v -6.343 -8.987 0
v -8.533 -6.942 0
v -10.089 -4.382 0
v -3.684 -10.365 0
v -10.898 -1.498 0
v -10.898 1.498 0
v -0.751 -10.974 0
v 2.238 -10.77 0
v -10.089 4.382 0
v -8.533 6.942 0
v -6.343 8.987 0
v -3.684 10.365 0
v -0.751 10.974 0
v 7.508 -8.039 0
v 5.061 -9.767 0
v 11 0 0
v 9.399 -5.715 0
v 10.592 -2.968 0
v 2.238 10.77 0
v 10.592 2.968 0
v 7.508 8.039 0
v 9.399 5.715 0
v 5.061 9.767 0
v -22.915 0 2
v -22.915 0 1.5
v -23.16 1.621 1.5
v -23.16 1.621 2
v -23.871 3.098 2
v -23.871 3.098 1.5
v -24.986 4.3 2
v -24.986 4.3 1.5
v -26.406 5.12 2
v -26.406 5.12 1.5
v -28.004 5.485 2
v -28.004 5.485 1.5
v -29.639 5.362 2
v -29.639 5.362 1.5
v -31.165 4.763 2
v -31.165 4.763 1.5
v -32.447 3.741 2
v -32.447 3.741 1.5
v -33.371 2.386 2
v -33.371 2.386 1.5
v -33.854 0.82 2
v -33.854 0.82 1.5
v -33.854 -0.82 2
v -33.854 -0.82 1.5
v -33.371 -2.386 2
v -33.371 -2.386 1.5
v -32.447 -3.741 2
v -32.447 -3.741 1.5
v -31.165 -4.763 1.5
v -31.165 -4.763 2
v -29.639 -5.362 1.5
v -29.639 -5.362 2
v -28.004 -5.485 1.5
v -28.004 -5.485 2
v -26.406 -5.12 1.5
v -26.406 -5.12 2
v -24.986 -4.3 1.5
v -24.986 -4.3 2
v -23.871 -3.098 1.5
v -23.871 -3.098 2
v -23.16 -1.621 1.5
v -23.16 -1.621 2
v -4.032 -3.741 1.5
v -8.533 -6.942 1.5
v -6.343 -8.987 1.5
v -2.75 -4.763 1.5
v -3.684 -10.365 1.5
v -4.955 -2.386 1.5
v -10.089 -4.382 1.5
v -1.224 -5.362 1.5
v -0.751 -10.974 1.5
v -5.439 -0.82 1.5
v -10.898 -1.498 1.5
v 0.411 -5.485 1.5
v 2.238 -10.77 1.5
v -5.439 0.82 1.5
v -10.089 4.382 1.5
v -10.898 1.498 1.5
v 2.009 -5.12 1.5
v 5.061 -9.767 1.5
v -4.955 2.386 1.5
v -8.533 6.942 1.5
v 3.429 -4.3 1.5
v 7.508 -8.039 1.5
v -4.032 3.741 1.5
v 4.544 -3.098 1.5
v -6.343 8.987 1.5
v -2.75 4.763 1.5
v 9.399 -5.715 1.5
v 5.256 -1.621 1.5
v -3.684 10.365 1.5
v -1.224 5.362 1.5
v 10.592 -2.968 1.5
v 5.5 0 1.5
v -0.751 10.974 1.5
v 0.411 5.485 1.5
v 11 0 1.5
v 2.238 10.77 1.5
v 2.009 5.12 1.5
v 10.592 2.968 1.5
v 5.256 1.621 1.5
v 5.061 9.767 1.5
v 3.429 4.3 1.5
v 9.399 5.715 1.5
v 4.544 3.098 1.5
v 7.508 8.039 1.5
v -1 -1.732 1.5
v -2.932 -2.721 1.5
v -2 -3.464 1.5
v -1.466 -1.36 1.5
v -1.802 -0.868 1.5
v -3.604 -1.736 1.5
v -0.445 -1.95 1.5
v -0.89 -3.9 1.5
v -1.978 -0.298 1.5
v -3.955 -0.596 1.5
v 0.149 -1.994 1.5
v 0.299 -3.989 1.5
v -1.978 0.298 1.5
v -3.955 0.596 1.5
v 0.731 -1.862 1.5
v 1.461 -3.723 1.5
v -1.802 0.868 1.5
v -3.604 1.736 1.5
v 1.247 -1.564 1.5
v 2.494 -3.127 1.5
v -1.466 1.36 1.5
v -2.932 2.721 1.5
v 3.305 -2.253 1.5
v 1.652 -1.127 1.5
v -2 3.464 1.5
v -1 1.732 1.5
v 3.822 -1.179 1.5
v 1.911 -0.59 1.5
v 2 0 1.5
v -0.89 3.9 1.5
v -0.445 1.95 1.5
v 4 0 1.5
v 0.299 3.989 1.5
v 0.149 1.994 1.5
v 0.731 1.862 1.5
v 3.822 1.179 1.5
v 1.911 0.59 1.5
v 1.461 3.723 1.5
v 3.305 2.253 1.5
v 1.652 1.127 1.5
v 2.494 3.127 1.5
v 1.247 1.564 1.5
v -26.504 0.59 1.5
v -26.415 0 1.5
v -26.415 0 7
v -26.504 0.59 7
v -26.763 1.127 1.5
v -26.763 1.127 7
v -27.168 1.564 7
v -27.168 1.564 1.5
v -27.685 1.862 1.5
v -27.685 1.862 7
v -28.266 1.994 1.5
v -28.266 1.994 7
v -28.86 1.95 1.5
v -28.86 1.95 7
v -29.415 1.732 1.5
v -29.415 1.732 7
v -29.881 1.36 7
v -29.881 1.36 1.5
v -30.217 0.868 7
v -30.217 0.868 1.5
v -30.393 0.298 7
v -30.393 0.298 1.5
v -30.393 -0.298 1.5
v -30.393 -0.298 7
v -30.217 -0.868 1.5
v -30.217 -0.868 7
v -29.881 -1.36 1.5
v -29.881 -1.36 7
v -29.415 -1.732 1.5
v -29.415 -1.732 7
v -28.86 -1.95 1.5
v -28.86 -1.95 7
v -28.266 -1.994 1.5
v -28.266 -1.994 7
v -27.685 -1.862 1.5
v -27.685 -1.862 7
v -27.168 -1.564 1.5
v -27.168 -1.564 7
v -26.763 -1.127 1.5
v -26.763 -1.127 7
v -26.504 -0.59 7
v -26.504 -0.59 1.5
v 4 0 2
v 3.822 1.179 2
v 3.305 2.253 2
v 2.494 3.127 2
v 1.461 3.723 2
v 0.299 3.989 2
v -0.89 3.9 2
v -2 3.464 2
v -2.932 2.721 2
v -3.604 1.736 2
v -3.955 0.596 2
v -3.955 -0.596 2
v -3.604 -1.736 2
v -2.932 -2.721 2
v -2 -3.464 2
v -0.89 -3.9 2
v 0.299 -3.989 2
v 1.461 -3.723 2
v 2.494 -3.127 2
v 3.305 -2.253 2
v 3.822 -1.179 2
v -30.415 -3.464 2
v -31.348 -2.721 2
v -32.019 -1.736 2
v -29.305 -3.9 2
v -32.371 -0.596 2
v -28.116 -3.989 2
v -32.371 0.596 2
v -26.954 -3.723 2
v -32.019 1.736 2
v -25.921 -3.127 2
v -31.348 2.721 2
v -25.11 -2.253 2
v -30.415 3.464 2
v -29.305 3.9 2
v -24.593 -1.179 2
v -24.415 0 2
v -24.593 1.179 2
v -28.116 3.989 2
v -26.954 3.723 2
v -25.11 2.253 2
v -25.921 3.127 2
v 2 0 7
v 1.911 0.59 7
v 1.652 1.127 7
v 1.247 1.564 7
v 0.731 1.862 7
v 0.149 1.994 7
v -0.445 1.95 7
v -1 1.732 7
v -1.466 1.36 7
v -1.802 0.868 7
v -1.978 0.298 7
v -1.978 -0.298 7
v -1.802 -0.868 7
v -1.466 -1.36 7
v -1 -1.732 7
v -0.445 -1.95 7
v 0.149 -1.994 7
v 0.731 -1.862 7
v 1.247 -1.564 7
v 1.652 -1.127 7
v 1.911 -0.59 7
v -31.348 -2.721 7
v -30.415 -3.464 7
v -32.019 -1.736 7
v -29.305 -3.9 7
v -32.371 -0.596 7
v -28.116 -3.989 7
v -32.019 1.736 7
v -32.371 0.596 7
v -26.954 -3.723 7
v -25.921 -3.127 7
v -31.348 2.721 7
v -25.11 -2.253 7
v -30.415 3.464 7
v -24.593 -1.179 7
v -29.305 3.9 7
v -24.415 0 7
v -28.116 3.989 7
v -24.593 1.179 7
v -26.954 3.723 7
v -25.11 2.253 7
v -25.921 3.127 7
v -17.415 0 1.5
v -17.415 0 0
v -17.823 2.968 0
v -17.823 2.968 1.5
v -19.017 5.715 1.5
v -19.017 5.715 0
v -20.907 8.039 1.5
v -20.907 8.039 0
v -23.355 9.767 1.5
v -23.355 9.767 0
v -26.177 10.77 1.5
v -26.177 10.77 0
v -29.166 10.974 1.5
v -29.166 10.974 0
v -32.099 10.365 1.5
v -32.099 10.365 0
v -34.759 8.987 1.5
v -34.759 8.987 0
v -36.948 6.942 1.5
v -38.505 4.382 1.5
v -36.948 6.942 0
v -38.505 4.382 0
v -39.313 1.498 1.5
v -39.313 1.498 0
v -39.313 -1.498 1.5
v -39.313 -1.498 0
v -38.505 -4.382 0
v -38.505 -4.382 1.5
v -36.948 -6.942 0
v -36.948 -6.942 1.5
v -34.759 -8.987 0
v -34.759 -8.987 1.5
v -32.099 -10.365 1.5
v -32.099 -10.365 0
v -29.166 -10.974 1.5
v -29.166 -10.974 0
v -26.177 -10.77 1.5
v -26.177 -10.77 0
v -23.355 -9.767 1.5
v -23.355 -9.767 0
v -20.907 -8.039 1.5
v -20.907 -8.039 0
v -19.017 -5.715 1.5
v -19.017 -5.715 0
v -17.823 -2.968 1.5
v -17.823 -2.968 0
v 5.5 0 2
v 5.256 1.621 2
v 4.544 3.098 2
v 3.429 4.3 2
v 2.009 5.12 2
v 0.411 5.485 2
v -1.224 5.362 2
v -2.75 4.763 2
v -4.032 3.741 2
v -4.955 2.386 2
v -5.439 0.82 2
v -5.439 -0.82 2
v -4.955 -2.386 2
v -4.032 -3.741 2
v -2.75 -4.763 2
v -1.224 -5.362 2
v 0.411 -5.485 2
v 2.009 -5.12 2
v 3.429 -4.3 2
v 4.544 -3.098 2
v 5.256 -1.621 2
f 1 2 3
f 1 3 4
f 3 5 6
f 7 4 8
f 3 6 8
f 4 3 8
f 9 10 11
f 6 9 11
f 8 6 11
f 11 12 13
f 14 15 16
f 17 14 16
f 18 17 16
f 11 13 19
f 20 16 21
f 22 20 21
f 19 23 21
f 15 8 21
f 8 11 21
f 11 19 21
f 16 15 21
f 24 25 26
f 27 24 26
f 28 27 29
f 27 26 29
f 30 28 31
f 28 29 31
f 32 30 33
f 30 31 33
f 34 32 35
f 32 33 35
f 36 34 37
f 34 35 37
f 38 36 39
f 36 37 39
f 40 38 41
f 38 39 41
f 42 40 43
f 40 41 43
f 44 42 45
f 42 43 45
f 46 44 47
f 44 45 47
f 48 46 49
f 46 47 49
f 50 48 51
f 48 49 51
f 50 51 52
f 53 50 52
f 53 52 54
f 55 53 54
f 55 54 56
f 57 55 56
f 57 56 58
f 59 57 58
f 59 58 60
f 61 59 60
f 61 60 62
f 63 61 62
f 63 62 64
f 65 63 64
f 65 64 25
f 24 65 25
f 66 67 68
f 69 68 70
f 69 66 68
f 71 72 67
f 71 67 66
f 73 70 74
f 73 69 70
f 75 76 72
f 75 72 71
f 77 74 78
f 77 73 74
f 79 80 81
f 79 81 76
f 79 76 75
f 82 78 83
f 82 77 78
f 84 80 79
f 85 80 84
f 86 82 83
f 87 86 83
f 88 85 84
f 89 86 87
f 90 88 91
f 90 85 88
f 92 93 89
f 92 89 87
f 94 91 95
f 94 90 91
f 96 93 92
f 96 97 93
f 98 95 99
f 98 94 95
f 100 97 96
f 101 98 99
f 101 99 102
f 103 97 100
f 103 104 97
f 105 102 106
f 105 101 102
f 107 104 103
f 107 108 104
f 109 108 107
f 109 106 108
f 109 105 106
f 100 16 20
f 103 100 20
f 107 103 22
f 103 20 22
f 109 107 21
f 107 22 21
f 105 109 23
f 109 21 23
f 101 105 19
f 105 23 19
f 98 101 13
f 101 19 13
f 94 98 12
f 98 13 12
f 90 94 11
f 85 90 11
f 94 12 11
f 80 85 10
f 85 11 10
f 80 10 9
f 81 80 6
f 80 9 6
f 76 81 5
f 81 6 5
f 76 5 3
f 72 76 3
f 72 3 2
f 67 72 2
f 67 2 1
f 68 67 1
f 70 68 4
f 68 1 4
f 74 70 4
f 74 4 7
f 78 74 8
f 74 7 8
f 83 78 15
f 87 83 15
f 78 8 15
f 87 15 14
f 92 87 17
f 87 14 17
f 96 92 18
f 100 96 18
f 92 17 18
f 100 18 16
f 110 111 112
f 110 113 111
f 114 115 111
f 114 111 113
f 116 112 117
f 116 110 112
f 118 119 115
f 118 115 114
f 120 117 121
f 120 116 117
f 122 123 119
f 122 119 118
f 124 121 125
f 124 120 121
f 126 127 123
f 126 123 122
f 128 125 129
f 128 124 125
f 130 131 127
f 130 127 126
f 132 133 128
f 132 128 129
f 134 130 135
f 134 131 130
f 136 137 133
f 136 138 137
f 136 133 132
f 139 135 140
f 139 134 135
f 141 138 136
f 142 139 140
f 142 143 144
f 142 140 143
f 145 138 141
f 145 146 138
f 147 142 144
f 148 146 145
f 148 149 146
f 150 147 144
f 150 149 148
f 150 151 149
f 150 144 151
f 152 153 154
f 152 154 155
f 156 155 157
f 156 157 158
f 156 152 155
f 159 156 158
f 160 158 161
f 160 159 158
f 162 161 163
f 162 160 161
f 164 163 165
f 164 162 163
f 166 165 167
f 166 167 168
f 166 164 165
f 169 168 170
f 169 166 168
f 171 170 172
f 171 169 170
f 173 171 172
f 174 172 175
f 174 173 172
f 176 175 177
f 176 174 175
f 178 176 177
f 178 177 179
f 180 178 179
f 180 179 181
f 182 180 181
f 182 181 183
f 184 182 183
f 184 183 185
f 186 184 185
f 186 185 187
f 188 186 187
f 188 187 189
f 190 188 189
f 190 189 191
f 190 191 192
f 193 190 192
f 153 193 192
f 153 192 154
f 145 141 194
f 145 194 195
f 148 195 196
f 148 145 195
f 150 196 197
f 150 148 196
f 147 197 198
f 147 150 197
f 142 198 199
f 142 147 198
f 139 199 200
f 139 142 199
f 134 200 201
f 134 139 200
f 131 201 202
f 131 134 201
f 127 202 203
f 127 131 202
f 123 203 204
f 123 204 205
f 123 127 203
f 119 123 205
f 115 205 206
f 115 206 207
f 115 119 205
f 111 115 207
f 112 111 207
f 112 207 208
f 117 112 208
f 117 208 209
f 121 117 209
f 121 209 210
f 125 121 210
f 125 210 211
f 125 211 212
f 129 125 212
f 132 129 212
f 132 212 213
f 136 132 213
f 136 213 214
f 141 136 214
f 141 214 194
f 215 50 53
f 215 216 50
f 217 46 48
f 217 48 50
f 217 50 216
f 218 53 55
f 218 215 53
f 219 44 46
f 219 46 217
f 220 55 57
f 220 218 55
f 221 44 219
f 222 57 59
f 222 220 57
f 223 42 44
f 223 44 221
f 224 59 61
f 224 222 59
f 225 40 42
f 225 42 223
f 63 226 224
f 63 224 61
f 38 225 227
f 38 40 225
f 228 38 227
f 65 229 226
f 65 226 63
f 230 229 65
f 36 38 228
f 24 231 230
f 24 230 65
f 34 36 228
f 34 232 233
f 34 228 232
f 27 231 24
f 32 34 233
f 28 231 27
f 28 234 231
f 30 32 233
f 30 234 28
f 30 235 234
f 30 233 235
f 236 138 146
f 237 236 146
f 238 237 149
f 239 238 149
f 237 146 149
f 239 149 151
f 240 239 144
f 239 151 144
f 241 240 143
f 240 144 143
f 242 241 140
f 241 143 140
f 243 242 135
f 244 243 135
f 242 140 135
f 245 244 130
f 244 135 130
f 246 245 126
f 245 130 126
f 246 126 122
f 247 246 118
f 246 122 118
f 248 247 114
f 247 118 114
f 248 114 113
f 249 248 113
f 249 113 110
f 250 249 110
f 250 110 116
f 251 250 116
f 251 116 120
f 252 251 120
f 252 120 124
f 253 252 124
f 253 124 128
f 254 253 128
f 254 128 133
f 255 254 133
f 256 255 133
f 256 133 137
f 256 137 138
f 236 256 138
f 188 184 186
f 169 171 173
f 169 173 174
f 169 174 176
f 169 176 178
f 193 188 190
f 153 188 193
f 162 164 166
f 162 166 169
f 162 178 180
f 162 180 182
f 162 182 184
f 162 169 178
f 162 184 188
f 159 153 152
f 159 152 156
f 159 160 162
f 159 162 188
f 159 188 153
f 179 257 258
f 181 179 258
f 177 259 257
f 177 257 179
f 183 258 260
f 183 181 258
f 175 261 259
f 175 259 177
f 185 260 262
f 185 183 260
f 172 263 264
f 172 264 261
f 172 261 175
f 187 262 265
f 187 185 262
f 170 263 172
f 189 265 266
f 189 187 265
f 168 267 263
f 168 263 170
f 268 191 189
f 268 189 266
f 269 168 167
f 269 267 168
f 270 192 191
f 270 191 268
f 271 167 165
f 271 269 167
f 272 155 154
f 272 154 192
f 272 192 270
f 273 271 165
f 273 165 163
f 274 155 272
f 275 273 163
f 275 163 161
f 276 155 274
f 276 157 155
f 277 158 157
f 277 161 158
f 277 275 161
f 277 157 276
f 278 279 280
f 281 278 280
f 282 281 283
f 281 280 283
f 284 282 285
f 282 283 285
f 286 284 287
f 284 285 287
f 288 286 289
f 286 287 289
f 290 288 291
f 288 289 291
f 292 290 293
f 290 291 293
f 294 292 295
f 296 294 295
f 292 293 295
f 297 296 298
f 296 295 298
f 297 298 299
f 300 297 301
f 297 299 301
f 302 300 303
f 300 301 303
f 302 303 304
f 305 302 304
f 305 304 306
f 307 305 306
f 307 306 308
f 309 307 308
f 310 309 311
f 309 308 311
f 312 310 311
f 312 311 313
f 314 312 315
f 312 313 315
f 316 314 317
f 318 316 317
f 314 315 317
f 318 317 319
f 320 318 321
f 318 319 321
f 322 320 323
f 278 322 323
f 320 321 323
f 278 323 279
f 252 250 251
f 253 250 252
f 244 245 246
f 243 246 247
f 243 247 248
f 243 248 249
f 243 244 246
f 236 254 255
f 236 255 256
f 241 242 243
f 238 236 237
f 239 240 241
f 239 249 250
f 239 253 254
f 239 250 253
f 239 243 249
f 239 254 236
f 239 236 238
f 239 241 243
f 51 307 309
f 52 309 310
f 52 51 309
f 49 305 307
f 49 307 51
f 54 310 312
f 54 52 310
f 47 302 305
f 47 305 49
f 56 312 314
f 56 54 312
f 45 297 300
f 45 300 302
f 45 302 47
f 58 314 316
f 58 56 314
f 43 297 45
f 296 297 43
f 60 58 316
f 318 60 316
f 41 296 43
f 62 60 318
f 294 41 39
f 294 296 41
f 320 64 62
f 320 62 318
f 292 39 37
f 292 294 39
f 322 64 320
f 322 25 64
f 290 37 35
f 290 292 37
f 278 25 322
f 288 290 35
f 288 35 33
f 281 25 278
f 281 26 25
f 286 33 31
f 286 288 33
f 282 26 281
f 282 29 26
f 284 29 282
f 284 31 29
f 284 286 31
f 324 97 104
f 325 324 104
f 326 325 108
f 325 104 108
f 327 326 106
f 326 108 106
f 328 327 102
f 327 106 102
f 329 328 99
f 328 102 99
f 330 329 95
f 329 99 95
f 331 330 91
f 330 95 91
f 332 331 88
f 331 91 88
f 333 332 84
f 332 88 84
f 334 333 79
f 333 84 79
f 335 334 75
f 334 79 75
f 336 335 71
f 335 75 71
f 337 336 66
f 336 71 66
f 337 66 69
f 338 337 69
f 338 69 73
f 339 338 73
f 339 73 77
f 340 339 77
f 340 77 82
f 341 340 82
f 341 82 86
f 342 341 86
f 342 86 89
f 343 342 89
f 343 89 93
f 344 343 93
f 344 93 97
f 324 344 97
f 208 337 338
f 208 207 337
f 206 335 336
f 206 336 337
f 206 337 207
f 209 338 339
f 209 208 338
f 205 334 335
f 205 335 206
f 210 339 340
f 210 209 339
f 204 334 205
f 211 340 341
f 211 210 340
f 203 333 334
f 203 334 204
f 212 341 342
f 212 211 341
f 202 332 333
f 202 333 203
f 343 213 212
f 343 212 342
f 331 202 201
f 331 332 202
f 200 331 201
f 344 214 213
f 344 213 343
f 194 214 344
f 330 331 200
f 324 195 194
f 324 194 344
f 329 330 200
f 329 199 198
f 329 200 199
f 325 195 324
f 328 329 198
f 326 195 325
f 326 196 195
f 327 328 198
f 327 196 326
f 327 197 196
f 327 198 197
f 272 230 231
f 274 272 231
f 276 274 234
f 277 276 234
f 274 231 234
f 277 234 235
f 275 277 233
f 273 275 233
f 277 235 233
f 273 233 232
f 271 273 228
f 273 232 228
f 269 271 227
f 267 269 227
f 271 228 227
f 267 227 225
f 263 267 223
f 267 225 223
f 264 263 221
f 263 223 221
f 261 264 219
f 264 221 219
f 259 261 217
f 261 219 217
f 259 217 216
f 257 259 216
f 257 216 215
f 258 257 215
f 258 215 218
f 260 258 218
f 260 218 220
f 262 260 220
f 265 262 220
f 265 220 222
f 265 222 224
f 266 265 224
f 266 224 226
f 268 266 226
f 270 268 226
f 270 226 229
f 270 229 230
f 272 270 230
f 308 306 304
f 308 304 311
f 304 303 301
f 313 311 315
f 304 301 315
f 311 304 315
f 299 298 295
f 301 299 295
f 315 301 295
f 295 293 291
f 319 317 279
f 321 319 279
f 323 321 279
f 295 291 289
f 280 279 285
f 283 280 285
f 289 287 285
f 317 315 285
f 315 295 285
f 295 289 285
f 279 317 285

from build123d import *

# Parameters (mm, degrees)
F0_R     = 11
F0_R_2   = 5.5
F1_DEPTH = 1.5
F0_R_3   = 4
F2_DEPTH = 2
F0_R_4   = 2
F3_DEPTH = 7
F4_DEPTH = 1.5
F5_DEPTH = 1.5


with BuildPart() as f1:
    # F0 (on Top) → F1 (new body)
    with BuildSketch(Plane.XY):
        Circle(F0_R)
        Circle(F0_R_2, mode=Mode.SUBTRACT)
    extrude(amount=F1_DEPTH)

    # F0 (on Top) → F2 (join)
    with BuildSketch(Plane.XY):
        Circle(F0_R_2)
        Circle(F0_R_3, mode=Mode.SUBTRACT)
    extrude(amount=F2_DEPTH)



with BuildPart() as f1b:
    # F0 (on Top) → F1, piece 2 (new body)
    with BuildSketch(Plane.XY):
        with Locations((-28.4153819084, 0)):
            Circle(F0_R)
        with Locations((-28.4153819084, 0)):
            Circle(F0_R_2, mode=Mode.SUBTRACT)
    extrude(amount=F1_DEPTH)

    # F0 (on Top) → F2, piece 2 (join)
    with BuildSketch(Plane.XY):
        with Locations((-28.4153819084, 0)):
            Circle(F0_R_2)
        with Locations((-28.4153819084, 0)):
            Circle(F0_R_3, mode=Mode.SUBTRACT)
    extrude(amount=F2_DEPTH)

    # F0 (on Top) → F3 (join)
    with BuildSketch(Plane.XY):
        with Locations((-28.4153819084, 0)):
            Circle(F0_R_3)
        with Locations((-28.4153819084, 0)):
            Circle(F0_R_4, mode=Mode.SUBTRACT)
    extrude(amount=F3_DEPTH)

    # F0 (on Top) → F5 (join)
    with BuildSketch(Plane.XY):
        with Locations((-28.4153819084, 0)):
            Circle(F0_R_4)
    extrude(amount=F5_DEPTH)


with BuildPart() as f3:
    # F0 (on Top) → F3, piece 2 (new body)
    with BuildSketch(Plane.XY):
        Circle(F0_R_4)
    extrude(amount=F3_DEPTH)


with BuildPart() as f1_1:
    add(f1.part)

    add(f3.part)  # F4 merges F3
    # F0 (on Top) → F4 (join)
    with BuildSketch(Plane.XY):
        Circle(F0_R_3)
        Circle(F0_R_4, mode=Mode.SUBTRACT)
    extrude(amount=F4_DEPTH)


solid = Compound([f1b.part, f1_1.part])
